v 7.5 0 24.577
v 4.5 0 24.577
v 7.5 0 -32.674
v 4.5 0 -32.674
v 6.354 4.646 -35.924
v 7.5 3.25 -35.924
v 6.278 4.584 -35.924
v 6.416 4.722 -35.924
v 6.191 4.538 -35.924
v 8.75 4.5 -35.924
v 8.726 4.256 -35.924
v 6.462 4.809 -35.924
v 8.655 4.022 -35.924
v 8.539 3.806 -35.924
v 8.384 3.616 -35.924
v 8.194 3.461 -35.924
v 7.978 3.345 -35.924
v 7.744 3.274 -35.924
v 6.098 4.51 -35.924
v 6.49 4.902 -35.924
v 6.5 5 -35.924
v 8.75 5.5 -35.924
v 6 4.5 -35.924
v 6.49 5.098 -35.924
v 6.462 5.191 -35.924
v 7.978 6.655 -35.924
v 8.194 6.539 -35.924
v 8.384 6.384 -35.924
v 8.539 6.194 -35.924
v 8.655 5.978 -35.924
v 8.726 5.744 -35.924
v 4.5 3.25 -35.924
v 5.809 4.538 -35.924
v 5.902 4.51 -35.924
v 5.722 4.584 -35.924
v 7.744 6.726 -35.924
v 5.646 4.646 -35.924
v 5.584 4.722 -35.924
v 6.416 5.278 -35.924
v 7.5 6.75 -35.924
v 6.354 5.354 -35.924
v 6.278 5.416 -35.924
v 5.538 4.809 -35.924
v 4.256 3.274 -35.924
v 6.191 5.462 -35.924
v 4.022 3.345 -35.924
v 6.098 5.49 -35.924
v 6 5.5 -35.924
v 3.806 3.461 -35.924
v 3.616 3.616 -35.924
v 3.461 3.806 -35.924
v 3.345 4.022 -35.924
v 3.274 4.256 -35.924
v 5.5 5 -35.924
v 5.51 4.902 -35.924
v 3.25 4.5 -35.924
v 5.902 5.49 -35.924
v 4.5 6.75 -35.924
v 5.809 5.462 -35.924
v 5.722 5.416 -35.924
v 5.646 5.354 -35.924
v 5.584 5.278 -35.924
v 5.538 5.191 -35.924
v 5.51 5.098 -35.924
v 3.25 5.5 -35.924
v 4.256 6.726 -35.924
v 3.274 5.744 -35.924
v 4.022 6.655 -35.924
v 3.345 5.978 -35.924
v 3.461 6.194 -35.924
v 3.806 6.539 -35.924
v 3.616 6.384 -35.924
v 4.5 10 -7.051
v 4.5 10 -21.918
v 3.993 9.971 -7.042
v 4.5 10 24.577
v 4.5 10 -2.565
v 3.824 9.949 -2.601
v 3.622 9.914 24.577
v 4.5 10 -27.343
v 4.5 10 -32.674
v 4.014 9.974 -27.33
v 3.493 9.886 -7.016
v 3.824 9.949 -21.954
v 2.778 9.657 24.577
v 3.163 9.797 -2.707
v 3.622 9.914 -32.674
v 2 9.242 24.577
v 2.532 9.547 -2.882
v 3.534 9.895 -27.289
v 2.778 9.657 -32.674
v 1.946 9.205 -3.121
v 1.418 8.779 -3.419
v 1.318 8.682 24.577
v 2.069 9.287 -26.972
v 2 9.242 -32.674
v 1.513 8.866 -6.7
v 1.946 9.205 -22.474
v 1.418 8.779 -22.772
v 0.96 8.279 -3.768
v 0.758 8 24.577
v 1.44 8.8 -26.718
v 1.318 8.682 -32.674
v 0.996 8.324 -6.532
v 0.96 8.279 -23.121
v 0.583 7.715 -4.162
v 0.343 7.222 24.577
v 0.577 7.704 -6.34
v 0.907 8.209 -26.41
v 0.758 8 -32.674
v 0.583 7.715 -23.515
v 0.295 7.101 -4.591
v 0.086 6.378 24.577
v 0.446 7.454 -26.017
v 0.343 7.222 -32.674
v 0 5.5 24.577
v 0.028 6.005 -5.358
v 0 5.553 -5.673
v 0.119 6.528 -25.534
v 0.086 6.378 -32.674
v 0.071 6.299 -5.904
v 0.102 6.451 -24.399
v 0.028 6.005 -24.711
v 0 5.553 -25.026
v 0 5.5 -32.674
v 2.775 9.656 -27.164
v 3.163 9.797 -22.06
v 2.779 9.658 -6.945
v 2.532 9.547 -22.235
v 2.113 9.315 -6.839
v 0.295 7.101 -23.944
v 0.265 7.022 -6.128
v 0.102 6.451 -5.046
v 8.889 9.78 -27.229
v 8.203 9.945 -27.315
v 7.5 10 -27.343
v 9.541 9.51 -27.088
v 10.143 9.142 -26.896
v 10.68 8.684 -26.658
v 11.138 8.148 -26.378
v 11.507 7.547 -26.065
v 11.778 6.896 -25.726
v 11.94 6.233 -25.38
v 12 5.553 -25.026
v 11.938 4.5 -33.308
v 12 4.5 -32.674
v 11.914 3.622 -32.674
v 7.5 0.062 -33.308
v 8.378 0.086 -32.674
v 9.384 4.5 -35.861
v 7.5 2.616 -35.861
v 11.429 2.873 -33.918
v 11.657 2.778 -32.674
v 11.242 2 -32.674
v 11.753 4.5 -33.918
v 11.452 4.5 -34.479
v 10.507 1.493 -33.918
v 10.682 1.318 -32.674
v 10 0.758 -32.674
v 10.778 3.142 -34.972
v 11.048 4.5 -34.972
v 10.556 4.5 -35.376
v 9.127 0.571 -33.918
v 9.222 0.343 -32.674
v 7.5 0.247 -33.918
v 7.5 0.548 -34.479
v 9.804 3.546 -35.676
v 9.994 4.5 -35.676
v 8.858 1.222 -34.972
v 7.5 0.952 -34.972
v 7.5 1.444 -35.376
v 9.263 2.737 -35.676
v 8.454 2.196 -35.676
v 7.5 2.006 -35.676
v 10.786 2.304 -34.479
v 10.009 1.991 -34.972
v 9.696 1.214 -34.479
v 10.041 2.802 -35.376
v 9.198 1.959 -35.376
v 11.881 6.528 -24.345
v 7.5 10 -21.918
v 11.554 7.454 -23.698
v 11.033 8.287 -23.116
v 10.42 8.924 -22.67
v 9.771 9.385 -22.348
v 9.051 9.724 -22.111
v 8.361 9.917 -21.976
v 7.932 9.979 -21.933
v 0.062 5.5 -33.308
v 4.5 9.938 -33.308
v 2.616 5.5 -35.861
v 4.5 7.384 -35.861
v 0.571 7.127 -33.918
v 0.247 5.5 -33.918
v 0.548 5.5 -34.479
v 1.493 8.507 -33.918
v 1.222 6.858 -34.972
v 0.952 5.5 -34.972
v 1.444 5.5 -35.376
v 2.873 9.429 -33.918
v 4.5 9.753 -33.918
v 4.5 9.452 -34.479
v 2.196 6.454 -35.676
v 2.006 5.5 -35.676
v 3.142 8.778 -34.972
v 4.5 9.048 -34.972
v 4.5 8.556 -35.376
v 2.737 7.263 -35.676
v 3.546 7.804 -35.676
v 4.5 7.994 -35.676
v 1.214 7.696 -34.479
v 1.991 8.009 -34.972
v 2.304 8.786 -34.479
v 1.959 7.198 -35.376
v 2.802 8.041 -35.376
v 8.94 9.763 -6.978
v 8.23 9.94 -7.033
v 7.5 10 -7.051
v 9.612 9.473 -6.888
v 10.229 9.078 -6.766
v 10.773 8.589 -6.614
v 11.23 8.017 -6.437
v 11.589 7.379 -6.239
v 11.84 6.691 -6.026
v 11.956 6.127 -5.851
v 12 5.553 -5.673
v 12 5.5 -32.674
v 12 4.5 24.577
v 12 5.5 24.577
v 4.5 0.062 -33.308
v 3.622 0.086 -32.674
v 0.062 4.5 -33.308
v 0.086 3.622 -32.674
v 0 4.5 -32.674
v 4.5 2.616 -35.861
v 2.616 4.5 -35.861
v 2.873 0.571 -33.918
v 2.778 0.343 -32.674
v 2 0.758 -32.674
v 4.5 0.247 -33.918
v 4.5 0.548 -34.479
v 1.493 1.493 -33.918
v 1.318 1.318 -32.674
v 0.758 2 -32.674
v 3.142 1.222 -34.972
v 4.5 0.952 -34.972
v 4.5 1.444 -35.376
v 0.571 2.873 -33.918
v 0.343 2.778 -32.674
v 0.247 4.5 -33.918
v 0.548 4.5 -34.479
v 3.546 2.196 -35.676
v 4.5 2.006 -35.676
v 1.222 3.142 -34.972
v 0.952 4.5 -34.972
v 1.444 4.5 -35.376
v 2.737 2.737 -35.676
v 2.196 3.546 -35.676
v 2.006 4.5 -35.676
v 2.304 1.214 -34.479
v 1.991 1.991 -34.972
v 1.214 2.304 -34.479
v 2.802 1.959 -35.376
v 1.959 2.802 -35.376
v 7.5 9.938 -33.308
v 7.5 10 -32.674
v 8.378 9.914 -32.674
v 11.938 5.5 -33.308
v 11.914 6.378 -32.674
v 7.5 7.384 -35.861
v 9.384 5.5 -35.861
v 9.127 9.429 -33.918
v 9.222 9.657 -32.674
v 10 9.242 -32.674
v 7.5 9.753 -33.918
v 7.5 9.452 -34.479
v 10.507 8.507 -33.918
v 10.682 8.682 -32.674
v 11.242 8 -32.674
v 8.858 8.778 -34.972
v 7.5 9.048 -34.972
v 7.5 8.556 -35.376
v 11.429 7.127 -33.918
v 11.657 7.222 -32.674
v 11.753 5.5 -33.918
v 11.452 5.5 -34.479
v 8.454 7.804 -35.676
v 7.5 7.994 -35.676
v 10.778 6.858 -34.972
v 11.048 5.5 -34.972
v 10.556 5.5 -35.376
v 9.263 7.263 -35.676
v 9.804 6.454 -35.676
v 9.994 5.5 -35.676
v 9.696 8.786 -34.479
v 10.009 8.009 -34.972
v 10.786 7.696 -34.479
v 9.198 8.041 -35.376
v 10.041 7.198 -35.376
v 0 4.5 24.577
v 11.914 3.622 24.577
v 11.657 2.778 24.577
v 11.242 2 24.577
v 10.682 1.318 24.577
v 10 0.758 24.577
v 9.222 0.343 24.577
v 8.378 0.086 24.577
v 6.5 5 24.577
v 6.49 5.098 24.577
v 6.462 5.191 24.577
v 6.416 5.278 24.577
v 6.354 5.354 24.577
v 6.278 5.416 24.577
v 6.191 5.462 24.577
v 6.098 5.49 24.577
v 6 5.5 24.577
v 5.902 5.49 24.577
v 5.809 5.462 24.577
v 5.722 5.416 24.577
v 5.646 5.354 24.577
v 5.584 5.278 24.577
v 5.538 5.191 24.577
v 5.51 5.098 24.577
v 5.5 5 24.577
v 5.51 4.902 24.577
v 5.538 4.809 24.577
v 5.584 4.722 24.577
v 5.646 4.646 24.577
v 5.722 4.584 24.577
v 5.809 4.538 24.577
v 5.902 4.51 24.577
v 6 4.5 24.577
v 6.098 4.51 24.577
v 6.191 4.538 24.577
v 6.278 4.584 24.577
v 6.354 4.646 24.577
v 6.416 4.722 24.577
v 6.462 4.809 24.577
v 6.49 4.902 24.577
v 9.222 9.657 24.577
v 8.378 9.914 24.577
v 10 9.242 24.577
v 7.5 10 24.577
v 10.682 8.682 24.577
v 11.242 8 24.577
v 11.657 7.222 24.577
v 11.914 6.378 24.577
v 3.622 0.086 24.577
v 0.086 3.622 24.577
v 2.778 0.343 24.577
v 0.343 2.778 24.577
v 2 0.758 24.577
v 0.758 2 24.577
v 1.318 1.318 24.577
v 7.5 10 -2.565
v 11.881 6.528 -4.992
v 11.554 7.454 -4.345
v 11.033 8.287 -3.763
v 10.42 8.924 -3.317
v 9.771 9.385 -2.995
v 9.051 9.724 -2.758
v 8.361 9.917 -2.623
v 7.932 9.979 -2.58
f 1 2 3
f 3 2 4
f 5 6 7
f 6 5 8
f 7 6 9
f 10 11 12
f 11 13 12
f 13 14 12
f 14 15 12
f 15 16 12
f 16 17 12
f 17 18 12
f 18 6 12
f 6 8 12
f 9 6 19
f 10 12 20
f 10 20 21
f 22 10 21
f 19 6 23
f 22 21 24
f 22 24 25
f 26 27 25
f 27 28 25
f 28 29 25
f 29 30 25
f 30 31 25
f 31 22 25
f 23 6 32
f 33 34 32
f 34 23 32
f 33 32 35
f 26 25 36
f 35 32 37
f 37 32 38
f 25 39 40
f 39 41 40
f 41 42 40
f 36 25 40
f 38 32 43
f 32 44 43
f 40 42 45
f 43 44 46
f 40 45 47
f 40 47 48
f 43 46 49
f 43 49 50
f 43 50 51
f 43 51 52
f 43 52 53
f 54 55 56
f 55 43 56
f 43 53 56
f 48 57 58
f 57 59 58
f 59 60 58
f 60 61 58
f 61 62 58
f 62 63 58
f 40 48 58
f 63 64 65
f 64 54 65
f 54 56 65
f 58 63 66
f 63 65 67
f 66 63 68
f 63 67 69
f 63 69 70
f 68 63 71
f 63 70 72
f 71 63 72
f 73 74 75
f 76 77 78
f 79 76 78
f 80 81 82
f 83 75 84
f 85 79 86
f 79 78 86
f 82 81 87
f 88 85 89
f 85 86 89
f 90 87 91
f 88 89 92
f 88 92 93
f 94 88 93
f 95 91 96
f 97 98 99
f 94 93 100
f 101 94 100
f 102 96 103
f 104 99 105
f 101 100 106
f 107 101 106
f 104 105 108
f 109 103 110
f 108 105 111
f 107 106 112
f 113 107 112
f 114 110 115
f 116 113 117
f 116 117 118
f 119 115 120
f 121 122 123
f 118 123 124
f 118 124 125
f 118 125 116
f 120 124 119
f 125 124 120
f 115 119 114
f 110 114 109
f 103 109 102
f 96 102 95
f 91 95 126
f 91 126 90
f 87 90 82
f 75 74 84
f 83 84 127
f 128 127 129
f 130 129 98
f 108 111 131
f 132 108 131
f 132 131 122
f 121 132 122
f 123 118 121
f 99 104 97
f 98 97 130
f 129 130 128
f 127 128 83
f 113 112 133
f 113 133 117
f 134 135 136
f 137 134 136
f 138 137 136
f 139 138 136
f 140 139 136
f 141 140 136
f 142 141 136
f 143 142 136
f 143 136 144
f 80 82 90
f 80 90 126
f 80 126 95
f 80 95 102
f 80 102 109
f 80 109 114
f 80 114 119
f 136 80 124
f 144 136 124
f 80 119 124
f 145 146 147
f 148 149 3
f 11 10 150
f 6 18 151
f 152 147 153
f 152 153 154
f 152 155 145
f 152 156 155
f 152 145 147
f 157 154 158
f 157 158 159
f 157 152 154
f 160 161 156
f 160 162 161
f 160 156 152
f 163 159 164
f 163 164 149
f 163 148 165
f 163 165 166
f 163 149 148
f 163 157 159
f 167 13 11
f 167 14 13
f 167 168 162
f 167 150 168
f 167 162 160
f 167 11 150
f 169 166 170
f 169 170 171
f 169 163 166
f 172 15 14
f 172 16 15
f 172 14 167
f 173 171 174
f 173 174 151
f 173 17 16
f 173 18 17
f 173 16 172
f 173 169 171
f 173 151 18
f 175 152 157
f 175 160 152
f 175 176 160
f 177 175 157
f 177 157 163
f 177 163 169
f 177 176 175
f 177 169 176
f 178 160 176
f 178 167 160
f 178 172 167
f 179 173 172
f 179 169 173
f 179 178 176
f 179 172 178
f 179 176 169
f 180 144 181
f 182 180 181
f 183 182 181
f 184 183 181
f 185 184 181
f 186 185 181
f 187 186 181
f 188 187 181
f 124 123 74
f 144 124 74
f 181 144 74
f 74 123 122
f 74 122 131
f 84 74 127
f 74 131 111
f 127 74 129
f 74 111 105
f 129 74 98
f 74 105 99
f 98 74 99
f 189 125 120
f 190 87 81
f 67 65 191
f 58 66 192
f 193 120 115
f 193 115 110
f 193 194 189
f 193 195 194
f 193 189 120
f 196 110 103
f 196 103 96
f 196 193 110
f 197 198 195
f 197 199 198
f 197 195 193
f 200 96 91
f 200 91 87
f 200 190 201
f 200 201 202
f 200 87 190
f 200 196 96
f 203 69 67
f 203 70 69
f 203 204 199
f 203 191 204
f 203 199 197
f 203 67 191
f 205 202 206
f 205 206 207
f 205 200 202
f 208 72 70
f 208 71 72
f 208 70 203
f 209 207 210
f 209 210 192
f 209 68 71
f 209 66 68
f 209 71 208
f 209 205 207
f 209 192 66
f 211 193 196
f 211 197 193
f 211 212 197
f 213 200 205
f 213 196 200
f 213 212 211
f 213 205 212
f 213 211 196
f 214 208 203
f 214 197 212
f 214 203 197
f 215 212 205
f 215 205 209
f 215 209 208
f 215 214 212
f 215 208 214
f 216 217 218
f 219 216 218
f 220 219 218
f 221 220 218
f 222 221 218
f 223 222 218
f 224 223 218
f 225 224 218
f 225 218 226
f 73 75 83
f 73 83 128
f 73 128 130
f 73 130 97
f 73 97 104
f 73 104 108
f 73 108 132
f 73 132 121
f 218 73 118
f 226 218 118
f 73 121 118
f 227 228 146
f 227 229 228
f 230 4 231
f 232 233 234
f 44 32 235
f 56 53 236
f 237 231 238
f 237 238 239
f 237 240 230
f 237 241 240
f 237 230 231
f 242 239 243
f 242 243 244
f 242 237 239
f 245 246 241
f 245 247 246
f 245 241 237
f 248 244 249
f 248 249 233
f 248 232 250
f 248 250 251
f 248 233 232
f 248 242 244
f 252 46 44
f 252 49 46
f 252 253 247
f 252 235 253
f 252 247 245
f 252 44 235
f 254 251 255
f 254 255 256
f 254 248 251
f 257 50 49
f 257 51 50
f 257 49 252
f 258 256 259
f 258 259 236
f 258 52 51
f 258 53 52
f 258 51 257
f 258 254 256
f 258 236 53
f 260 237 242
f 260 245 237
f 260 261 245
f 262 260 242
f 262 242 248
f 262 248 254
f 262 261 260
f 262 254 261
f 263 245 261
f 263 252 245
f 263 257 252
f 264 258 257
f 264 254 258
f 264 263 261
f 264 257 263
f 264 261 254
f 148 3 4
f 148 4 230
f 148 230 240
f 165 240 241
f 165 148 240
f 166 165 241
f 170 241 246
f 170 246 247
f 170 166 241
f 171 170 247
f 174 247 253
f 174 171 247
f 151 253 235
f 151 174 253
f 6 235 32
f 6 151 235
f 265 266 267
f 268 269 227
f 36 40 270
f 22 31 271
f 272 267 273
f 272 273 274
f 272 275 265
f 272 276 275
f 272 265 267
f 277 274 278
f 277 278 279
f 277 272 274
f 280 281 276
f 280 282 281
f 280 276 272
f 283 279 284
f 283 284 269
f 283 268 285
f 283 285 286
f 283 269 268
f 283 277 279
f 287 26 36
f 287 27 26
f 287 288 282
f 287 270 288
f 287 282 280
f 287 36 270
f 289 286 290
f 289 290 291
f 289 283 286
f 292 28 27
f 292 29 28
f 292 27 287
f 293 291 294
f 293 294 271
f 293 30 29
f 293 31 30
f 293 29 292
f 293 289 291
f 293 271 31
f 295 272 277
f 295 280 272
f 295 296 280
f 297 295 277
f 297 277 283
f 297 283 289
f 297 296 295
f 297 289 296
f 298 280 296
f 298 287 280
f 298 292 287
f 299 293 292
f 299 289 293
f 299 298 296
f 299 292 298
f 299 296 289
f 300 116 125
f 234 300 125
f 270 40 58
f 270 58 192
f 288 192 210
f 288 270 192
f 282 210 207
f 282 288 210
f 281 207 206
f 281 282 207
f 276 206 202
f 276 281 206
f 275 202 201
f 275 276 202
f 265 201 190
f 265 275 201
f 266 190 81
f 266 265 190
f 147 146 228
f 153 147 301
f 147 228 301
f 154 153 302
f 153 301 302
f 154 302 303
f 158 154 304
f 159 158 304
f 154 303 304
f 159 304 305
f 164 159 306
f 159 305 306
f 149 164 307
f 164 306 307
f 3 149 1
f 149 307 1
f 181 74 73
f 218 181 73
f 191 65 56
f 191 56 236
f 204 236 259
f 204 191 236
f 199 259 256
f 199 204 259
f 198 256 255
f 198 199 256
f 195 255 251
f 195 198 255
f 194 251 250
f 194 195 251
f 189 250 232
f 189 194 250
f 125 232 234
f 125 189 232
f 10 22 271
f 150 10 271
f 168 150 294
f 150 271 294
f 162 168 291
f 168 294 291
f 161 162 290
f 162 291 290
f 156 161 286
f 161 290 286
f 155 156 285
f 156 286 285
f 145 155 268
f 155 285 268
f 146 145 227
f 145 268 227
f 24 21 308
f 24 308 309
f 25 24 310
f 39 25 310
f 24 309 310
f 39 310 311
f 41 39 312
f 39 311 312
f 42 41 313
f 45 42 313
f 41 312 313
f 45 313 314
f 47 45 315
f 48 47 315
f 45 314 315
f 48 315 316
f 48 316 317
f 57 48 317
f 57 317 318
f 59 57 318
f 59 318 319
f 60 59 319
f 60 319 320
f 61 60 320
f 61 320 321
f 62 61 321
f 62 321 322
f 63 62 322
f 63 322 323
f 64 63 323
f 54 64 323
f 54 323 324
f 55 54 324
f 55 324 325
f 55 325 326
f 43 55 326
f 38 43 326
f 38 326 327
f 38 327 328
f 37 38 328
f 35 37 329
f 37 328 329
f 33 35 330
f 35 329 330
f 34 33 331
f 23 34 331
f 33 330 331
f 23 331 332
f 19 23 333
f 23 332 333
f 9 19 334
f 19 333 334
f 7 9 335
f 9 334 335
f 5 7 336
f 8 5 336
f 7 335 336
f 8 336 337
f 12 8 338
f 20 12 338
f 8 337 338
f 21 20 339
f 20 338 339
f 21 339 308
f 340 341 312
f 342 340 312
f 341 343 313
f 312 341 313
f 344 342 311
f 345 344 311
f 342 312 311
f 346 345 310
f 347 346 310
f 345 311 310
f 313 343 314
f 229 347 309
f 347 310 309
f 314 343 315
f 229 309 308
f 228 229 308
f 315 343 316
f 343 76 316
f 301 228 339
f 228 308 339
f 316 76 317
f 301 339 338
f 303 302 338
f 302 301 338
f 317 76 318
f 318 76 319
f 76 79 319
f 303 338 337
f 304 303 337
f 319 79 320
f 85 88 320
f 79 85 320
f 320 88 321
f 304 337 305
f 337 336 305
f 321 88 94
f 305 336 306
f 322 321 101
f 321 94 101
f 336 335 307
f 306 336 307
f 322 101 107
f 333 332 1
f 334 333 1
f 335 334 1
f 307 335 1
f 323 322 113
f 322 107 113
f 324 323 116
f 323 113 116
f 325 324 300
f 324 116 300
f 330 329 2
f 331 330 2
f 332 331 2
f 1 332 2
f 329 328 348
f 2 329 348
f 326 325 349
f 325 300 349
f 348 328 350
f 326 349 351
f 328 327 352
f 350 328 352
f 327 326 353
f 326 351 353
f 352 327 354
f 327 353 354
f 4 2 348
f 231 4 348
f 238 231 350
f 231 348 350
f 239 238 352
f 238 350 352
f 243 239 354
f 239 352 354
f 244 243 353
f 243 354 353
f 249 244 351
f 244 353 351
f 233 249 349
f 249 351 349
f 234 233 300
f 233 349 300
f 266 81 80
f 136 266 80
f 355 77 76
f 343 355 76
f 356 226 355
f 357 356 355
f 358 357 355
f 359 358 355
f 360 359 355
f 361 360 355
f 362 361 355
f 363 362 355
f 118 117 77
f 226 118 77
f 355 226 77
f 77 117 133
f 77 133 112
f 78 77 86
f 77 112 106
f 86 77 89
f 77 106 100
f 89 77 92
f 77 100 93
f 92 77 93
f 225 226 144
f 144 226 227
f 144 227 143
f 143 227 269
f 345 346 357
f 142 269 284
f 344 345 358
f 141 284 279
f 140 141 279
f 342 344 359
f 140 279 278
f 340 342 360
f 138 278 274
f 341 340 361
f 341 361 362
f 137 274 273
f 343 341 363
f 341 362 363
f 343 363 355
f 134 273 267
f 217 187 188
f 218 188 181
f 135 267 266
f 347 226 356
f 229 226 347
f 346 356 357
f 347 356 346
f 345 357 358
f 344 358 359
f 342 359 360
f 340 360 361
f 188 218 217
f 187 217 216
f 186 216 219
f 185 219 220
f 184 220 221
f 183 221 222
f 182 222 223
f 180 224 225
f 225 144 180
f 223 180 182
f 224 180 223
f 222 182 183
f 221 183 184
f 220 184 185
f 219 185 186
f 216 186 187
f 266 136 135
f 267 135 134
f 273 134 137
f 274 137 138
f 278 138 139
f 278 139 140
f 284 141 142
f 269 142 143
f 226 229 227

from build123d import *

# Parameters (mm, degrees)
BOSS_EXTRUDE1_DEPTH = 12
SKETCH2_R           = 0.5
CUT_EXTRUDE1_DEPTH  = 63.485196025
FILLET1_R           = 3.25
FILLET2_R           = 4.5


with BuildPart() as part:
    # Sketch1 → Boss-Extrude1 (new body)
    with BuildSketch(Plane(origin=(0, 0, 0), x_dir=(0, 0, -1), z_dir=(1, 0, 0))):
        Polygon((-24.577392289, 0), (35.923845073, 0), (35.923845073, 10), (27.343441845, 10), (25.026106666, 5.553221685), (21.918270736, 10), (7.051101363, 10), (5.673226392, 5.553221685), (2.565390462, 10), (-24.577392289, 10), align=None)
    extrude(amount=BOSS_EXTRUDE1_DEPTH)

    # Sketch2 → Cut-Extrude1 (cut, through all)
    with BuildSketch(Plane.XY.offset(24.577392289)):
        with Locations((6, 5)):
            Circle(SKETCH2_R)
    extrude(amount=-CUT_EXTRUDE1_DEPTH, mode=Mode.SUBTRACT)

    # Fillet1
    fillet1_edges = [part.edges().sort_by_distance(p)[0] for p in [
        (12, 5, -35.923845073),
        (0, 5, -35.923845073),
        (6, 10, -35.923845073),
        (6, 0, -35.923845073),
    ]]
    fillet(fillet1_edges, radius=FILLET1_R)

    # Fillet2
    # the kernel refuses this fillet: 4.5 mm, written as the material it takes off along each edge
    with BuildSketch(Plane(origin=(4.5, 4.5, -35.923845073), x_dir=(0, -1, 0), z_dir=(1, 0, 0))) as fillet2_piece_1:
        with BuildLine():
            CenterArc((1.25, -3.25), 3.25, 0, 90)
            Line((4.5, -3.25), (4.5, 0))
            Line((4.5, 0), (1.25, 0))
        make_face()
    revolve(axis=Axis((4.5, 4.5, -35.923845073), (0, 0, -1)), revolution_arc=90, mode=Mode.SUBTRACT)
    with BuildSketch(Plane(origin=(4.5, 5.5, -35.923845073), x_dir=(-1, 0, 0), z_dir=(0, -1, 0))) as fillet2_piece_2:
        with BuildLine():
            CenterArc((1.25, -3.25), 3.25, 0, 90)
            Line((4.5, -3.25), (4.5, 0))
            Line((4.5, 0), (1.25, 0))
        make_face()
    revolve(axis=Axis((4.5, 5.5, -35.923845073), (0, 0, -1)), revolution_arc=90, mode=Mode.SUBTRACT)
    with BuildSketch(Plane(origin=(7.5, 4.5, -35.923845073), x_dir=(1, 0, 0), z_dir=(0, 1, 0))) as fillet2_piece_3:
        with BuildLine():
            CenterArc((1.25, -3.25), 3.25, 0, 90)
            Line((4.5, -3.25), (4.5, 0))
            Line((4.5, 0), (1.25, 0))
        make_face()
    revolve(axis=Axis((7.5, 4.5, -35.923845073), (0, 0, -1)), revolution_arc=90, mode=Mode.SUBTRACT)
    with BuildSketch(Plane(origin=(7.5, 5.5, -35.923845073), x_dir=(0, 1, 0), z_dir=(-1, 0, 0))) as fillet2_piece_4:
        with BuildLine():
            CenterArc((1.25, -3.25), 3.25, 0, 90)
            Line((4.5, -3.25), (4.5, 0))
            Line((4.5, 0), (1.25, 0))
        make_face()
    revolve(axis=Axis((7.5, 5.5, -35.923845073), (0, 0, -1)), revolution_arc=90, mode=Mode.SUBTRACT)
    with BuildSketch(Plane(origin=(0, 10, -33.168270736), x_dir=(0, -1, 0), z_dir=(0, 0, 1))) as fillet2_piece_5:
        with BuildLine():
            CenterArc((FILLET2_R, FILLET2_R), FILLET2_R, 180, 90)
            Line((0, FILLET2_R), (0, 0))
            Line((0, 0), (FILLET2_R, 0))
        make_face()
    extrude(amount=37.367169374, mode=Mode.SUBTRACT)
    with BuildSketch(Plane(origin=(0, 0, 35.827392289), x_dir=(1, 0, 0), z_dir=(0, 0, -1))) as fillet2_piece_6:
        with BuildLine():
            CenterArc((FILLET2_R, -FILLET2_R), FILLET2_R, 90, 90)
            Line((0, -FILLET2_R), (0, 0))
            Line((0, 0), (FILLET2_R, 0))
        make_face()
    extrude(amount=71.751237362, mode=Mode.SUBTRACT)
    with BuildSketch(Plane(origin=(12, 10, -33.168270736), x_dir=(0, -1, 0), z_dir=(0, 0, 1))) as fillet2_piece_7:
        with BuildLine():
            CenterArc((FILLET2_R, -FILLET2_R), FILLET2_R, 90, 90)
            Line((0, -FILLET2_R), (0, 0))
            Line((0, 0), (FILLET2_R, 0))
        make_face()
    extrude(amount=37.367169374, mode=Mode.SUBTRACT)
    with BuildSketch(Plane(origin=(12, 10, -13.815390462), x_dir=(0, -1, 0), z_dir=(0, 0, 1))) as fillet2_piece_8:
        with BuildLine():
            CenterArc((FILLET2_R, -FILLET2_R), FILLET2_R, 90, 90)
            Line((0, -FILLET2_R), (0, 0))
            Line((0, 0), (FILLET2_R, 0))
        make_face()
    extrude(amount=49.642782751, mode=Mode.SUBTRACT)
    with BuildSketch(Plane(origin=(12, 10, -35.923845073), x_dir=(0, -1, 0), z_dir=(0, 0, 1))) as fillet2_piece_9:
        with BuildLine():
            CenterArc((FILLET2_R, -FILLET2_R), FILLET2_R, 90, 90)
            Line((0, -FILLET2_R), (0, 0))
            Line((0, 0), (FILLET2_R, 0))
        make_face()
    extrude(amount=19.830403228, mode=Mode.SUBTRACT)
    with BuildSketch(Plane(origin=(0, 10, -35.923845073), x_dir=(0, -1, 0), z_dir=(0, 0, 1))) as fillet2_piece_10:
        with BuildLine():
            CenterArc((FILLET2_R, FILLET2_R), FILLET2_R, 180, 90)
            Line((0, FILLET2_R), (0, 0))
            Line((0, 0), (FILLET2_R, 0))
        make_face()
    extrude(amount=19.830403228, mode=Mode.SUBTRACT)
    with BuildSketch(Plane(origin=(12, 0, 35.827392289), x_dir=(-1, 0, 0), z_dir=(0, 0, -1))) as fillet2_piece_11:
        with BuildLine():
            CenterArc((FILLET2_R, FILLET2_R), FILLET2_R, 180, 90)
            Line((0, FILLET2_R), (0, 0))
            Line((0, 0), (FILLET2_R, 0))
        make_face()
    extrude(amount=71.751237362, mode=Mode.SUBTRACT)
    with BuildSketch(Plane(origin=(0, 10, -13.815390462), x_dir=(0, -1, 0), z_dir=(0, 0, 1))) as fillet2_piece_12:
        with BuildLine():
            CenterArc((FILLET2_R, FILLET2_R), FILLET2_R, 180, 90)
            Line((0, FILLET2_R), (0, 0))
            Line((0, 0), (FILLET2_R, 0))
        make_face()
    extrude(amount=49.642782751, mode=Mode.SUBTRACT)


solid = part.part
